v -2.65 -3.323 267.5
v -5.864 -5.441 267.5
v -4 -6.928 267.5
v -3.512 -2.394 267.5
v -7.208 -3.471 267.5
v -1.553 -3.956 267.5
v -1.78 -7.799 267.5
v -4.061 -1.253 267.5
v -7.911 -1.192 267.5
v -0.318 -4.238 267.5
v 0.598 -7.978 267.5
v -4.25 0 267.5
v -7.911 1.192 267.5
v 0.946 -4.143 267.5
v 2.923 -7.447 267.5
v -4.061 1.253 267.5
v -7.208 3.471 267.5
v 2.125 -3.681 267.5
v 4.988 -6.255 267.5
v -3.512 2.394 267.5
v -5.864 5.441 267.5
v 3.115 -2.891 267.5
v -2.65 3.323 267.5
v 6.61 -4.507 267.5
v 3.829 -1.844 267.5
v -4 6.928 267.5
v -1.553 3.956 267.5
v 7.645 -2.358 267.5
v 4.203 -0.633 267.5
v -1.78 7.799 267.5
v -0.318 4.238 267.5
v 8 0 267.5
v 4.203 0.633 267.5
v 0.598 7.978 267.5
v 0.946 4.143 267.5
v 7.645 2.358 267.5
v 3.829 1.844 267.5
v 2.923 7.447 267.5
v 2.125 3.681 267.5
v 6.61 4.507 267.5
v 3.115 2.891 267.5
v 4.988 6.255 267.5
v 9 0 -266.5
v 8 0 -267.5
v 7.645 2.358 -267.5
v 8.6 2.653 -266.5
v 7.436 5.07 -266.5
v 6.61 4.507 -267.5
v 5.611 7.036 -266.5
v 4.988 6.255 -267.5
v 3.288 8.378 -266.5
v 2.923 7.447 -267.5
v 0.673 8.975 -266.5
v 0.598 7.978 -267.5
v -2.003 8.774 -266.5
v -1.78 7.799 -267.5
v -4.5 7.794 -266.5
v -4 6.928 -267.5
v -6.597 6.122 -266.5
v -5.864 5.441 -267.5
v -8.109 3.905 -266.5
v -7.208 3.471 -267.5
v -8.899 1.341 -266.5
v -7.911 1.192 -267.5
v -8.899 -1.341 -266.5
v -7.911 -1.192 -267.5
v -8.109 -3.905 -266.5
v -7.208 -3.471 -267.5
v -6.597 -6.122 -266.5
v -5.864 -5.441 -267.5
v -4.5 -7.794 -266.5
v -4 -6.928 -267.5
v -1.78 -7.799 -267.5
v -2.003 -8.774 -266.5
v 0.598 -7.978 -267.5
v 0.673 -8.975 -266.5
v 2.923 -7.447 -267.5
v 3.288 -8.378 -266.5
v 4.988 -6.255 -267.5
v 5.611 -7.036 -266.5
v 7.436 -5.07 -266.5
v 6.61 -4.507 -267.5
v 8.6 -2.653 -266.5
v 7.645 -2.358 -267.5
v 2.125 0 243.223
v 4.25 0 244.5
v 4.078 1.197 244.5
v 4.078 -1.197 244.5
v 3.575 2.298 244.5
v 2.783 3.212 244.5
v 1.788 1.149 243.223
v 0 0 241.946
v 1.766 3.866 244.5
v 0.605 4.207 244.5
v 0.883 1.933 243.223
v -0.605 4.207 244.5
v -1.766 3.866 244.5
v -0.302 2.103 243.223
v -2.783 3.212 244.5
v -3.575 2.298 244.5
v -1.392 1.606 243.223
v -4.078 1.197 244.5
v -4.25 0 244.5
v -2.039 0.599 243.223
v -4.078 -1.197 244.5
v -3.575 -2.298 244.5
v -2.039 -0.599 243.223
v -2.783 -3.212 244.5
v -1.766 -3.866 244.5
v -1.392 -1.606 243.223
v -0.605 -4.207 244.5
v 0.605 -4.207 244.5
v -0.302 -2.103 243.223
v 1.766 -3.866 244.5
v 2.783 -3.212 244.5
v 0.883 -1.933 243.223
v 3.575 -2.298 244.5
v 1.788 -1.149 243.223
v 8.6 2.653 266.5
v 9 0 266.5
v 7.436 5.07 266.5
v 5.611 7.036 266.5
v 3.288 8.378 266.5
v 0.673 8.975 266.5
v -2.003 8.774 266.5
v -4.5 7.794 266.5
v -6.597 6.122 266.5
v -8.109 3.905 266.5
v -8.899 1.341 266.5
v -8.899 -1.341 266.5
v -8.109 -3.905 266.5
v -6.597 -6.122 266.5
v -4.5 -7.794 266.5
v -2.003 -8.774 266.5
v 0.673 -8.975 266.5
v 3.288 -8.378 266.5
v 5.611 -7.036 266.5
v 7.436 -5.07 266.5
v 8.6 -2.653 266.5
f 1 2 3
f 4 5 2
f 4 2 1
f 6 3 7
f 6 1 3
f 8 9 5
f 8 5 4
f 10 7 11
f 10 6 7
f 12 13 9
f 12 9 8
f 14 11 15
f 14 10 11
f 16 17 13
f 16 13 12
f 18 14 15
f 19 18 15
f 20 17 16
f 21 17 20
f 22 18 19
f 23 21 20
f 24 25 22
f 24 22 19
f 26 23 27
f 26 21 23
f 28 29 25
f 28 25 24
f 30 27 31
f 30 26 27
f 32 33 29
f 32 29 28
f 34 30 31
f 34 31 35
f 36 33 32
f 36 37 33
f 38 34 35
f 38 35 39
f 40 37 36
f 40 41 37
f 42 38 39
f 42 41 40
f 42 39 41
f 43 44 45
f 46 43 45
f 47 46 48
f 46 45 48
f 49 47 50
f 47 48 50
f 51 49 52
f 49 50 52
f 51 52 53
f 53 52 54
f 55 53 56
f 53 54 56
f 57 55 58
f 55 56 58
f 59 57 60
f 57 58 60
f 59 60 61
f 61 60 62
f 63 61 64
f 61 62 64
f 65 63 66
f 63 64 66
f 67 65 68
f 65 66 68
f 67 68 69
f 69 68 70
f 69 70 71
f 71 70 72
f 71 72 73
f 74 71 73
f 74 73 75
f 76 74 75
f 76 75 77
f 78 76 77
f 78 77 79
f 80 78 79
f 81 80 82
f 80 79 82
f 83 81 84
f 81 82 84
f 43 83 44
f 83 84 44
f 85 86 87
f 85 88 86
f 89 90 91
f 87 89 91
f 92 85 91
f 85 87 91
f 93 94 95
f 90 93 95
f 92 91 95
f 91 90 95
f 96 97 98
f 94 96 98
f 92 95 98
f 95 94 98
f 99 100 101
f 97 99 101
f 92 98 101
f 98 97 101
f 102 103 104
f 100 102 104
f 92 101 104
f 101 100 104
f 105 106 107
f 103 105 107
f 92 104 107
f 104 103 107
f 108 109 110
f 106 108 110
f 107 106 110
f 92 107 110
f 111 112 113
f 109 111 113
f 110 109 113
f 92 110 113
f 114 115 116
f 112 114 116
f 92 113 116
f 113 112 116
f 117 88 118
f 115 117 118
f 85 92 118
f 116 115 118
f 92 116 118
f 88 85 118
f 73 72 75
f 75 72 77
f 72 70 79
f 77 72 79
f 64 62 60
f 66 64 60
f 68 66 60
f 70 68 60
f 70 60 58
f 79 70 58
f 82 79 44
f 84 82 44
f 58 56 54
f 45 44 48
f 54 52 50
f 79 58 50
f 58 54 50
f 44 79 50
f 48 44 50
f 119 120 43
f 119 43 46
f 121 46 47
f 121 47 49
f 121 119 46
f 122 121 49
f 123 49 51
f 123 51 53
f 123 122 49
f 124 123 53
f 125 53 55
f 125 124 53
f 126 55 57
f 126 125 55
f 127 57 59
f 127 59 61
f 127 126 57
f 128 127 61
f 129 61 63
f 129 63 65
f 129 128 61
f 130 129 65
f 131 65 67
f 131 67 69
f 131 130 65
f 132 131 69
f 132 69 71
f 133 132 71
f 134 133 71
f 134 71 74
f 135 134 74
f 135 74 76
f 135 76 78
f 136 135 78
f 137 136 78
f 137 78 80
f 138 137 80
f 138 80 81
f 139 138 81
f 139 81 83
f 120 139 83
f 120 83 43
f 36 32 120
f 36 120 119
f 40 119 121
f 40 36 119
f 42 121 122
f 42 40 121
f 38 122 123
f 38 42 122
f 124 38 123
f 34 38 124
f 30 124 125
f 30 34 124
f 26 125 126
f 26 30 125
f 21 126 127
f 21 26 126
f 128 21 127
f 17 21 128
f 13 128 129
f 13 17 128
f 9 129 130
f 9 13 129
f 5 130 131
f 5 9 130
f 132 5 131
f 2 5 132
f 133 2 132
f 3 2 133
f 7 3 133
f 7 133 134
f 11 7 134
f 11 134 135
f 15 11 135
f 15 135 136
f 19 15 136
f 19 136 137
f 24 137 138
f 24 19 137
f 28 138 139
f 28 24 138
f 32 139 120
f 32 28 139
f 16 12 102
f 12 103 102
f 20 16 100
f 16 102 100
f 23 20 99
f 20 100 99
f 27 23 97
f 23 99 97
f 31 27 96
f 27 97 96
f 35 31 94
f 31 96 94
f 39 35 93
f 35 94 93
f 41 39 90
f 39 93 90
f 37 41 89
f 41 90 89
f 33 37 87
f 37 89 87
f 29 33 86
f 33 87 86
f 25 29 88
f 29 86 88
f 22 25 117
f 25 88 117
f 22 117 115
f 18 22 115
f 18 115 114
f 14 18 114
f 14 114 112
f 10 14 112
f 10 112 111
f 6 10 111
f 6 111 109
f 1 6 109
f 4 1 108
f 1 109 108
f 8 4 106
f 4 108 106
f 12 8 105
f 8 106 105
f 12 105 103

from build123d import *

# Parameters (mm, degrees)
SKIZZE1_R                    = 9
BASIS_LINEAR_AUSTRAGEN_DEPTH = 267.5
FASE1_SIZE                   = 1
BOHRUNG1_D                   = 8.5
BOHRUNG1_DEPTH               = 23
BOHRUNG1_TIP                 = 2.553657631


with BuildPart() as part:
    # Skizze1 → Basis-Linear austragen (new, symmetric)
    with BuildSketch(Plane.XY):
        Circle(SKIZZE1_R)
    extrude(amount=BASIS_LINEAR_AUSTRAGEN_DEPTH, both=True)

    # Fase1
    fase1_edges = [part.edges().sort_by_distance(p)[0] for p in [
        (-9, 0, -267.5),
        (-9, 0, 267.5),
    ]]
    chamfer(fase1_edges, length=FASE1_SIZE)

    # Bohrung1
    with Locations(Plane.XY.offset(267.5)):
        with Locations((0, 0)):
            Hole(BOHRUNG1_D / 2, depth=BOHRUNG1_DEPTH)
            with Locations((0, 0, -(BOHRUNG1_DEPTH + BOHRUNG1_TIP / 2))):  # 118° drill point
                Cone(0, BOHRUNG1_D / 2, BOHRUNG1_TIP, mode=Mode.SUBTRACT)


solid = part.part
